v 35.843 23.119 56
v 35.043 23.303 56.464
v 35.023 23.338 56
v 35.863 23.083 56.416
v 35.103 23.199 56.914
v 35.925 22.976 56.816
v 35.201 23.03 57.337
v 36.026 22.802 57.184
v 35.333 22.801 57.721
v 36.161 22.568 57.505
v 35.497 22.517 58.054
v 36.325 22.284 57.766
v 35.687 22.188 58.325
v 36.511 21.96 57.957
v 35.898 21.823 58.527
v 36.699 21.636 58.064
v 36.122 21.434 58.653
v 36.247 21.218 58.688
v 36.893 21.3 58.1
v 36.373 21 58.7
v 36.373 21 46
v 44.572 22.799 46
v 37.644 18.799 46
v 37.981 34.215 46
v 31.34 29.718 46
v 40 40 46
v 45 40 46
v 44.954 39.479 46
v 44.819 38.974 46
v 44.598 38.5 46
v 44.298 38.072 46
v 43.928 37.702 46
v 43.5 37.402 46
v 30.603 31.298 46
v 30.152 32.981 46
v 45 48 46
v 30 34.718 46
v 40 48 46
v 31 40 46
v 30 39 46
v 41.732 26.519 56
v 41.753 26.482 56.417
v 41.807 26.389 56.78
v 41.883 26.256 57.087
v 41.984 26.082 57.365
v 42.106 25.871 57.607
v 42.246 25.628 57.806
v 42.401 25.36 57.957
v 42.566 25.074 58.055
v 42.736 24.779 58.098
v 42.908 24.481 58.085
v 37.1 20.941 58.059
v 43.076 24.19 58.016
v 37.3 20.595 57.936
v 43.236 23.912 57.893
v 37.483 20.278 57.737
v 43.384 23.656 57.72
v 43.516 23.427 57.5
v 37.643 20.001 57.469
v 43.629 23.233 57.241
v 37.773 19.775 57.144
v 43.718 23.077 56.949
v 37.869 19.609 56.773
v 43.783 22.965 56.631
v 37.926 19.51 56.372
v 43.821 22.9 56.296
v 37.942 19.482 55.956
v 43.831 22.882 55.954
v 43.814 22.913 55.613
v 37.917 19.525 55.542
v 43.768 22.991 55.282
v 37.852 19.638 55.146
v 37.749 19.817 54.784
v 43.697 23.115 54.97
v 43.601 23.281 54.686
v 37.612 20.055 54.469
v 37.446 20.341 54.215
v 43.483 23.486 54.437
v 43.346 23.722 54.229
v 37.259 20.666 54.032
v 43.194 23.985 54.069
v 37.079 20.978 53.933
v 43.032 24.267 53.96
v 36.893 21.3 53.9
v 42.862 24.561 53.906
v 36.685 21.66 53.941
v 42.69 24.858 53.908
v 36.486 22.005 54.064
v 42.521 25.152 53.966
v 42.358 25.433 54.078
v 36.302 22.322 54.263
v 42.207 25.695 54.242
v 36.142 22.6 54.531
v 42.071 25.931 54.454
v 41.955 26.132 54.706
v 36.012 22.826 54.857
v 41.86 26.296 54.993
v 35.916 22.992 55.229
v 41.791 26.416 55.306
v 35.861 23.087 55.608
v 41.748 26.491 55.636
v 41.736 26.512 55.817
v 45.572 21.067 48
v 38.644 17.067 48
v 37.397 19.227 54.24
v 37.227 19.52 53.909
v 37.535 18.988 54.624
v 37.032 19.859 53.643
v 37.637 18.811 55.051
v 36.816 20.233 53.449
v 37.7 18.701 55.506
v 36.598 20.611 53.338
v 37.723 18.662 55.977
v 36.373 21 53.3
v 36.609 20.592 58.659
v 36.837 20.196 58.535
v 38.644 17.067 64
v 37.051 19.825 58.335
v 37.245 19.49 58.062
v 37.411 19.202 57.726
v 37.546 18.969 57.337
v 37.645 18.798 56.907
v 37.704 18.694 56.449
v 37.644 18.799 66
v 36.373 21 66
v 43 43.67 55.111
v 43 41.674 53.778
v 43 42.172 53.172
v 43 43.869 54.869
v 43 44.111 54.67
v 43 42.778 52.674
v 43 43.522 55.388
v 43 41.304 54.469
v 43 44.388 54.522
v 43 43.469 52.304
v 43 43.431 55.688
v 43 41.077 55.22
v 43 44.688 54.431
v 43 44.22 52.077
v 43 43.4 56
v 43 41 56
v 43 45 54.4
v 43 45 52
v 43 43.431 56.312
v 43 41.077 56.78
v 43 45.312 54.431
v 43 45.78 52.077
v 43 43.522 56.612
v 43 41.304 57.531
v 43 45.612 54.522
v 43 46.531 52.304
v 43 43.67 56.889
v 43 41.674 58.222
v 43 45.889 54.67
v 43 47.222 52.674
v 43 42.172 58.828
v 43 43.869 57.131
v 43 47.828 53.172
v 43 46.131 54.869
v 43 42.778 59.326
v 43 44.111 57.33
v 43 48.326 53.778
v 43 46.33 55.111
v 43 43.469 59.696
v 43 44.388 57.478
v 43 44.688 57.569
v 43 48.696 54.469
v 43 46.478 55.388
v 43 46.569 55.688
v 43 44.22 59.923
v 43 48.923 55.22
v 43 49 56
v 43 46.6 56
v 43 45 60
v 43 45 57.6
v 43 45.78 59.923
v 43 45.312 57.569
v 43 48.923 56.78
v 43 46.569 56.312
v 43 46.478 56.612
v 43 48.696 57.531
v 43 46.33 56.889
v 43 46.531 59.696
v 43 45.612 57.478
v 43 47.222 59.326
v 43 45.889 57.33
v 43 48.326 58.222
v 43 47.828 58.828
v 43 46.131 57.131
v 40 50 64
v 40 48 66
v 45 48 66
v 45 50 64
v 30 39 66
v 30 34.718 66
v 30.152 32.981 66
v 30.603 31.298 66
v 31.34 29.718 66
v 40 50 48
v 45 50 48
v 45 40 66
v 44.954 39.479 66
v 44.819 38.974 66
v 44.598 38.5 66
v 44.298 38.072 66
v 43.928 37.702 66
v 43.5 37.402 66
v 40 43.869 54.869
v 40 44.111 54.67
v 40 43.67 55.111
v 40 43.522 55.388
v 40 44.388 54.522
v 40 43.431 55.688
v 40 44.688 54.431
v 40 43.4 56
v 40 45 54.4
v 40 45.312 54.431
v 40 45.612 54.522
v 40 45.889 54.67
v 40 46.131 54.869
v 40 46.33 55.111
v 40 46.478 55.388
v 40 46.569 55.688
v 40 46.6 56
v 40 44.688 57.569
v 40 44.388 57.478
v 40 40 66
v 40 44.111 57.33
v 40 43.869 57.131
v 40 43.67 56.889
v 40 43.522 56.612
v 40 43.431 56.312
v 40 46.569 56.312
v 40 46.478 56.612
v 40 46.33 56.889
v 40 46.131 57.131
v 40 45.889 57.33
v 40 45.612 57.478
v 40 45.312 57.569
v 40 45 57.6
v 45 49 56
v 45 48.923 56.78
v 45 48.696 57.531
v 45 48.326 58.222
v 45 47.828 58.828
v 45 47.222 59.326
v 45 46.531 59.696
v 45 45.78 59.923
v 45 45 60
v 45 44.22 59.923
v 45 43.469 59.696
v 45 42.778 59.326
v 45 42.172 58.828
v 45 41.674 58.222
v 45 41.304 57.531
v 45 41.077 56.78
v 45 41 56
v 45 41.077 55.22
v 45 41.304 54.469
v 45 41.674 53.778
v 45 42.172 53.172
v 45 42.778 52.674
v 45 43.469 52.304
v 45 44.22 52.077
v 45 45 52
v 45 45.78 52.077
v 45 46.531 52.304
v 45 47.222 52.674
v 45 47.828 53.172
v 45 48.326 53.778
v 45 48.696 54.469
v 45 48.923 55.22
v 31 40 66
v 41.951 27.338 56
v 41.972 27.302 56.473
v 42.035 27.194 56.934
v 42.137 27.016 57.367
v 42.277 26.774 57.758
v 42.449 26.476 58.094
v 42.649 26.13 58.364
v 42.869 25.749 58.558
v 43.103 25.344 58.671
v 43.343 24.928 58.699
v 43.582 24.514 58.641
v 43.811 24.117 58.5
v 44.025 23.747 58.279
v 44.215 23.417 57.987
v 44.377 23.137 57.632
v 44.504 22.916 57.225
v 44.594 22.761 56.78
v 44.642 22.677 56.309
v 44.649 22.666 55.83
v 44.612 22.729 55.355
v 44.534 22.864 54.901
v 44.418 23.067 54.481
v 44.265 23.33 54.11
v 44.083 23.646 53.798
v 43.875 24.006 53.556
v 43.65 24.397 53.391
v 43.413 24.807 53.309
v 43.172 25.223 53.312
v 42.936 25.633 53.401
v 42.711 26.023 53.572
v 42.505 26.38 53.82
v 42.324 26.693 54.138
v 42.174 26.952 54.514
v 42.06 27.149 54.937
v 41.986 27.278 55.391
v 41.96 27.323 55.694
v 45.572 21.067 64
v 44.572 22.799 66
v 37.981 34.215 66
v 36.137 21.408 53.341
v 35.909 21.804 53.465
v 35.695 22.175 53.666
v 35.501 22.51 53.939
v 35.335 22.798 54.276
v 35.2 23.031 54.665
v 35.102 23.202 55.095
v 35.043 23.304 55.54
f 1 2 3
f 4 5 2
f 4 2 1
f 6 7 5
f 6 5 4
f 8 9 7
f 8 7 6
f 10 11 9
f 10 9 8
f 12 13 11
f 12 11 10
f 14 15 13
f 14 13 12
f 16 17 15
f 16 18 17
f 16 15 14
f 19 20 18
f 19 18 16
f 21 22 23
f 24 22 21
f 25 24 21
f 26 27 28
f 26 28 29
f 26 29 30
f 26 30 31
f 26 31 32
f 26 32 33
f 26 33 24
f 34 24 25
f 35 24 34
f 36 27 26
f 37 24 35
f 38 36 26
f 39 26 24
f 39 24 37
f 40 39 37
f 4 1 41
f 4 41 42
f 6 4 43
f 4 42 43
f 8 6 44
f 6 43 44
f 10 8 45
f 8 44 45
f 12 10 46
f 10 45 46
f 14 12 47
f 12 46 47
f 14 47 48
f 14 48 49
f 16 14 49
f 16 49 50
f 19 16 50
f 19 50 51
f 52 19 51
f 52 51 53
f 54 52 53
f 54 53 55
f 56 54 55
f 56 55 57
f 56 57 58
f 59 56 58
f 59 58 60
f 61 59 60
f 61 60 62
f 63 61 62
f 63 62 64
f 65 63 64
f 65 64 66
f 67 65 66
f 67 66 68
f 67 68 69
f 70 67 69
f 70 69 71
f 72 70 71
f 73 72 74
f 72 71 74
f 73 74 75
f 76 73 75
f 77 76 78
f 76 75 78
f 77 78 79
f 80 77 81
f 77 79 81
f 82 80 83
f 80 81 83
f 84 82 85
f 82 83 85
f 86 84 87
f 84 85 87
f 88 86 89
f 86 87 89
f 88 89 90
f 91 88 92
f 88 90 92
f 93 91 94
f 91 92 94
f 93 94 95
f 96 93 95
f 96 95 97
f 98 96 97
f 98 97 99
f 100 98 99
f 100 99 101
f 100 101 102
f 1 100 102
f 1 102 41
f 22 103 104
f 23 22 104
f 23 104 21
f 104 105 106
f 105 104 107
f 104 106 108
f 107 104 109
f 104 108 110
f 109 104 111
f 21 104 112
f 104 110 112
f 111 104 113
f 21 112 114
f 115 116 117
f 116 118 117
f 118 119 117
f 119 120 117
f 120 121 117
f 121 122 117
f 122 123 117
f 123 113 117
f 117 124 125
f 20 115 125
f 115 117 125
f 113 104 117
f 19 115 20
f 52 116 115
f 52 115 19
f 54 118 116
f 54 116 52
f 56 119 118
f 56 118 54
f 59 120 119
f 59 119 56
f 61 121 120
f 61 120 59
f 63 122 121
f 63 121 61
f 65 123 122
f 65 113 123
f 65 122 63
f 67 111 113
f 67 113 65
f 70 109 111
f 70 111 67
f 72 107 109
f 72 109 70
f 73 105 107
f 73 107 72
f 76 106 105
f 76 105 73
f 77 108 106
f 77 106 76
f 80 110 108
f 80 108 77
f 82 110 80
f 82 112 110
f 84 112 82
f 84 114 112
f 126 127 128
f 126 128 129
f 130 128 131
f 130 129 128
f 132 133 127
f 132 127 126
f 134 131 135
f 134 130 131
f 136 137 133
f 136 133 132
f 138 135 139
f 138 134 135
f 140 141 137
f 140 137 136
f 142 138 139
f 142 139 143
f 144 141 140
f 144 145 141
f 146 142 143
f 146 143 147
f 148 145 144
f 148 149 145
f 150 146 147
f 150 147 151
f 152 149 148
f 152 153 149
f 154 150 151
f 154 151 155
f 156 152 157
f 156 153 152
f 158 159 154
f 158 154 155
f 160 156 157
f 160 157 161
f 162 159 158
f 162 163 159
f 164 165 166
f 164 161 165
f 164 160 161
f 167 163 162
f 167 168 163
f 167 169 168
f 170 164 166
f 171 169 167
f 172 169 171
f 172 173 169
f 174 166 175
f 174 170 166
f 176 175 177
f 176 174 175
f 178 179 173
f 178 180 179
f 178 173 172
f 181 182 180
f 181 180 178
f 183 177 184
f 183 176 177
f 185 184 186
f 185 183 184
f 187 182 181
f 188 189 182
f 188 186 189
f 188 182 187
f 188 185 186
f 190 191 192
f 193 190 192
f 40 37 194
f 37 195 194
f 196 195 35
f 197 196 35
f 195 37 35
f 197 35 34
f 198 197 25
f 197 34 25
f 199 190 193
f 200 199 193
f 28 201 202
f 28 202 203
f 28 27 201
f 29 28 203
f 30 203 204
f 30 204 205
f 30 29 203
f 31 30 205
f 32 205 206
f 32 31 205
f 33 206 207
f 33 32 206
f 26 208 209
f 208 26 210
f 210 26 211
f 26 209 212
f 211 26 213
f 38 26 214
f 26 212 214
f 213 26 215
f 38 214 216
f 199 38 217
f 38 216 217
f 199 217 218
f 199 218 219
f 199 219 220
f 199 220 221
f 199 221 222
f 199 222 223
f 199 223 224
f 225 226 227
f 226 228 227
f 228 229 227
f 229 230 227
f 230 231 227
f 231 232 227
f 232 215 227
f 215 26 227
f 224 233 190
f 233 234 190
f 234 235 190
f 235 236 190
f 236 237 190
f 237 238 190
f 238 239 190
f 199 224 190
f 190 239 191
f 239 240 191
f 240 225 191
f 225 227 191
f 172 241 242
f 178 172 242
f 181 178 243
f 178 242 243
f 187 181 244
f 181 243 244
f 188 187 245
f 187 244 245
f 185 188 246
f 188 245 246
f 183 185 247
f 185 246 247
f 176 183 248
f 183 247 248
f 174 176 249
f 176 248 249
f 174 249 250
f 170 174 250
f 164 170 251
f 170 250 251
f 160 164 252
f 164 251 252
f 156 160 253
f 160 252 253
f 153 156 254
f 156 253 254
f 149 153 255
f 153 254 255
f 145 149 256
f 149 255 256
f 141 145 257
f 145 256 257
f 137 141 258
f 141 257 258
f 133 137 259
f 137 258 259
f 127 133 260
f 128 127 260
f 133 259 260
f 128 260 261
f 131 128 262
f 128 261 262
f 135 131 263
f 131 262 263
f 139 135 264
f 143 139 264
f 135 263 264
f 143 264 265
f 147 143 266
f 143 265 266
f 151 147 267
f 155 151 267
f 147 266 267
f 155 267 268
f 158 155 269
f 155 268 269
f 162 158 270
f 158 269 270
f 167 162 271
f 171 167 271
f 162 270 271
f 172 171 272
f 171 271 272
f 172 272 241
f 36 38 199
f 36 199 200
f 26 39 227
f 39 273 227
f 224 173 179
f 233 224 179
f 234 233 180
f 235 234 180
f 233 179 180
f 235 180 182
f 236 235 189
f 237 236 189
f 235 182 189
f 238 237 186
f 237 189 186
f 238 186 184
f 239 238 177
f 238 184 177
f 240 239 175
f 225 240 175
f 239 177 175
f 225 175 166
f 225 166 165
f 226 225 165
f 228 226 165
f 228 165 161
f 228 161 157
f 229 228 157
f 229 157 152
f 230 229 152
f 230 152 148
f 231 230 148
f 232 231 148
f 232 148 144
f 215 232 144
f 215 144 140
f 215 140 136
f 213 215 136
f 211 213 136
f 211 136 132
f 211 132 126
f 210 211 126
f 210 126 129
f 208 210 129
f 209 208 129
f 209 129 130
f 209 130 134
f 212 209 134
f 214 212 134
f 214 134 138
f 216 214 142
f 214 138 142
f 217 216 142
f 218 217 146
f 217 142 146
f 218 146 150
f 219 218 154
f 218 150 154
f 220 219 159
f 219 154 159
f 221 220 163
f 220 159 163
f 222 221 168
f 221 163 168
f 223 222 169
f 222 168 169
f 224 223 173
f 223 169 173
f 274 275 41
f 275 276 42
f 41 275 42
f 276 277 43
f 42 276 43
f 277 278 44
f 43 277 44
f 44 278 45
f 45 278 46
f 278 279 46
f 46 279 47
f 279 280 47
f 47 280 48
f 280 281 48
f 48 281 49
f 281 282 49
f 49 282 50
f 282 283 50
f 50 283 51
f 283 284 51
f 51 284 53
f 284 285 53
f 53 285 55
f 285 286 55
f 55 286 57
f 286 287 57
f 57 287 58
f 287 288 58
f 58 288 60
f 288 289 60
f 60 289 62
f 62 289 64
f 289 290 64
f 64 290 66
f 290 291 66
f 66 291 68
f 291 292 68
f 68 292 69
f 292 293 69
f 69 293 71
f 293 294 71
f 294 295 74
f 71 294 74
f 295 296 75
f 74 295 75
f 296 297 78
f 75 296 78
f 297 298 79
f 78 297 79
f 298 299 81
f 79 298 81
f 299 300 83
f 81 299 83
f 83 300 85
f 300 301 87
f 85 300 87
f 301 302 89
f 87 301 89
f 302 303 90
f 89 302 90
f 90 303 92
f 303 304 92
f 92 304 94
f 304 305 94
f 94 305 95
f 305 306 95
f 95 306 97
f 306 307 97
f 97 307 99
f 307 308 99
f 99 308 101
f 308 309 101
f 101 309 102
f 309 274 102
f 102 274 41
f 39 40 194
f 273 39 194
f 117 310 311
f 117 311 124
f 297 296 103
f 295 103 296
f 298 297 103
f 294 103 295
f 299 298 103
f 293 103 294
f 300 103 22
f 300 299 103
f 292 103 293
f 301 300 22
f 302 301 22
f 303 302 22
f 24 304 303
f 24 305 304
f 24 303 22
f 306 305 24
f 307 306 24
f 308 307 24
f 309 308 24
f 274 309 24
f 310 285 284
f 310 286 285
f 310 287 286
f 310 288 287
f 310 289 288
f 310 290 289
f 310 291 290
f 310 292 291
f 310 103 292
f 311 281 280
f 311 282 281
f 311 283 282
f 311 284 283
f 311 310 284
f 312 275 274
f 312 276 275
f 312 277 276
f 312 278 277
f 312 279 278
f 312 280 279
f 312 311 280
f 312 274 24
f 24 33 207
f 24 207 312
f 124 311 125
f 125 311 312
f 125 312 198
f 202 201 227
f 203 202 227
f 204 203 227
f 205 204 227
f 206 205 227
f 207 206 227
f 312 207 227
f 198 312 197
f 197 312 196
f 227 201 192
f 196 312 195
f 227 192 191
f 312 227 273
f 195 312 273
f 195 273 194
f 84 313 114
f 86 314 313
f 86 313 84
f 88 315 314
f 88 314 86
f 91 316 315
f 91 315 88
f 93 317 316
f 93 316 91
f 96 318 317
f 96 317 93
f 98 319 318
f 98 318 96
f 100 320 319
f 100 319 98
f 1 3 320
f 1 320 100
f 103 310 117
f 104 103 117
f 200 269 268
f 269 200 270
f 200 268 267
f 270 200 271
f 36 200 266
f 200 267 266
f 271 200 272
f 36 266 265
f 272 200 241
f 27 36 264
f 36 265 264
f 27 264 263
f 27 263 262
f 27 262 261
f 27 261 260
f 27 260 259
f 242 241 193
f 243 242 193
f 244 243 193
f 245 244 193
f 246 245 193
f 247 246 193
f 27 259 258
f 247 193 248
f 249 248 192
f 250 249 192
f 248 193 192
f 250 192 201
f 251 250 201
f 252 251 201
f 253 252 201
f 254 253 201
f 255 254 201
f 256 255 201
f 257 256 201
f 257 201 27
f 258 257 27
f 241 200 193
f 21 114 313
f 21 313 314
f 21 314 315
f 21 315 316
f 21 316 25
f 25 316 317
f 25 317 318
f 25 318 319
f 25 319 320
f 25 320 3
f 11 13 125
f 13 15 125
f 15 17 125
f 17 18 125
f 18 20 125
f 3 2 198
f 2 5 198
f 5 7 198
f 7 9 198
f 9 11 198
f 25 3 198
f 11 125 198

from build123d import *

# Parameters (mm, degrees)
PAD026_DEPTH      = 10
SKETCH046_R       = 1.6
POCKET018_DEPTH   = 15.001
SKETCH047_R       = 4
POCKET019_DEPTH   = 2
POCKET019_FACE6_W = 8
POCKET019_FACE6_H = 20
POCKET024_DEPTH   = 6.1
CHAMFER008_SIZE   = 2
FILLET014_R       = 10
FILLET015_R       = 3
CHAMFER009_SIZE   = 1
SKETCH048_R       = 2.1
POCKET020_DEPTH   = 15.4865555595
CHAMFER010_SIZE   = 0.6


with BuildPart() as part:
    # Sketch045 → Pad026 (new body, symmetric)
    with BuildSketch(Plane.XY):
        Polygon((40, 50), (45, 50), (45, 38.2679491924), (37.9807621135, 34.2153903092), (43.3012701892, 25), (48.6217782649, 15.7846096908), (41.6935750346, 11.7846096908), (36.3730669589, 21), (30, 32.0384757729), (30, 40), (40, 40), align=None)
    extrude(amount=PAD026_DEPTH, both=True)

    # Sketch046 (on Face5 of Pad026) → Pocket018 (cut, through all)
    with BuildSketch(Plane.YZ.offset(45)):
        with Locations((45, 0)):
            Circle(SKETCH046_R)
    extrude(amount=-POCKET018_DEPTH, mode=Mode.SUBTRACT)

    # Sketch047 (on Face9 of Pocket018) → Pocket019 (cut)
    with BuildSketch(Plane.YZ.offset(45)):
        with Locations((45, 0)):
            Circle(SKETCH047_R)
    extrude(amount=-POCKET019_DEPTH, mode=Mode.SUBTRACT)

    # Pocket019 Face6 → Pocket024 (cut)
    with BuildSketch(Plane(origin=(45.1576766498, 13.7846096908, 0), x_dir=(-0.8660254038, -0.5, 0), z_dir=(0.5, -0.8660254038, 0))):
        Rectangle(POCKET019_FACE6_W, POCKET019_FACE6_H)
    extrude(amount=-POCKET024_DEPTH, mode=Mode.SUBTRACT)

    # Chamfer008
    chamfer008_edges = [part.edges().sort_by_distance(p)[0] for p in [
        (42.5, 50, 10),
        (42.5, 50, -10),
        (42.107677, 19.067365, 10),
        (42.107677, 19.067365, -10),
    ]]
    chamfer(chamfer008_edges, length=CHAMFER008_SIZE)

    # Fillet014
    fillet014_edges = [part.edges().sort_by_distance(p)[0] for p in [
        (30, 32.038476, 0),
    ]]
    fillet(fillet014_edges, radius=FILLET014_R)

    # Fillet015
    fillet015_edges = [part.edges().sort_by_distance(p)[0] for p in [
        (45, 38.267949, 0),
    ]]
    fillet(fillet015_edges, radius=FILLET015_R)

    # Chamfer009
    chamfer009_edges = [part.edges().sort_by_distance(p)[0] for p in [
        (30, 40, 0),
    ]]
    chamfer(chamfer009_edges, length=CHAMFER009_SIZE)

    # Sketch048 (on Face13 of Chamfer009) → Pocket020 (cut, through all)
    with BuildSketch(Plane(origin=(43.3012701892, 25, 0), x_dir=(-0.5, 0.8660254038, 0), z_dir=(0.8660254038, 0.5, 0))):
        Circle(SKETCH048_R)
    extrude(amount=-POCKET020_DEPTH, mode=Mode.SUBTRACT)

    # Chamfer010
    chamfer010_edges = [part.edges().sort_by_distance(p)[0] for p in [
        (44.35127, 23.181347, 0),
        (37.423067, 19.181347, 0),
    ]]
    chamfer(chamfer010_edges, length=CHAMFER010_SIZE)


with BuildPart() as part_1:
    # Body026 placement: moved
    add(part.part.moved(Location((0, 0, 56))))


solid = part_1.part
